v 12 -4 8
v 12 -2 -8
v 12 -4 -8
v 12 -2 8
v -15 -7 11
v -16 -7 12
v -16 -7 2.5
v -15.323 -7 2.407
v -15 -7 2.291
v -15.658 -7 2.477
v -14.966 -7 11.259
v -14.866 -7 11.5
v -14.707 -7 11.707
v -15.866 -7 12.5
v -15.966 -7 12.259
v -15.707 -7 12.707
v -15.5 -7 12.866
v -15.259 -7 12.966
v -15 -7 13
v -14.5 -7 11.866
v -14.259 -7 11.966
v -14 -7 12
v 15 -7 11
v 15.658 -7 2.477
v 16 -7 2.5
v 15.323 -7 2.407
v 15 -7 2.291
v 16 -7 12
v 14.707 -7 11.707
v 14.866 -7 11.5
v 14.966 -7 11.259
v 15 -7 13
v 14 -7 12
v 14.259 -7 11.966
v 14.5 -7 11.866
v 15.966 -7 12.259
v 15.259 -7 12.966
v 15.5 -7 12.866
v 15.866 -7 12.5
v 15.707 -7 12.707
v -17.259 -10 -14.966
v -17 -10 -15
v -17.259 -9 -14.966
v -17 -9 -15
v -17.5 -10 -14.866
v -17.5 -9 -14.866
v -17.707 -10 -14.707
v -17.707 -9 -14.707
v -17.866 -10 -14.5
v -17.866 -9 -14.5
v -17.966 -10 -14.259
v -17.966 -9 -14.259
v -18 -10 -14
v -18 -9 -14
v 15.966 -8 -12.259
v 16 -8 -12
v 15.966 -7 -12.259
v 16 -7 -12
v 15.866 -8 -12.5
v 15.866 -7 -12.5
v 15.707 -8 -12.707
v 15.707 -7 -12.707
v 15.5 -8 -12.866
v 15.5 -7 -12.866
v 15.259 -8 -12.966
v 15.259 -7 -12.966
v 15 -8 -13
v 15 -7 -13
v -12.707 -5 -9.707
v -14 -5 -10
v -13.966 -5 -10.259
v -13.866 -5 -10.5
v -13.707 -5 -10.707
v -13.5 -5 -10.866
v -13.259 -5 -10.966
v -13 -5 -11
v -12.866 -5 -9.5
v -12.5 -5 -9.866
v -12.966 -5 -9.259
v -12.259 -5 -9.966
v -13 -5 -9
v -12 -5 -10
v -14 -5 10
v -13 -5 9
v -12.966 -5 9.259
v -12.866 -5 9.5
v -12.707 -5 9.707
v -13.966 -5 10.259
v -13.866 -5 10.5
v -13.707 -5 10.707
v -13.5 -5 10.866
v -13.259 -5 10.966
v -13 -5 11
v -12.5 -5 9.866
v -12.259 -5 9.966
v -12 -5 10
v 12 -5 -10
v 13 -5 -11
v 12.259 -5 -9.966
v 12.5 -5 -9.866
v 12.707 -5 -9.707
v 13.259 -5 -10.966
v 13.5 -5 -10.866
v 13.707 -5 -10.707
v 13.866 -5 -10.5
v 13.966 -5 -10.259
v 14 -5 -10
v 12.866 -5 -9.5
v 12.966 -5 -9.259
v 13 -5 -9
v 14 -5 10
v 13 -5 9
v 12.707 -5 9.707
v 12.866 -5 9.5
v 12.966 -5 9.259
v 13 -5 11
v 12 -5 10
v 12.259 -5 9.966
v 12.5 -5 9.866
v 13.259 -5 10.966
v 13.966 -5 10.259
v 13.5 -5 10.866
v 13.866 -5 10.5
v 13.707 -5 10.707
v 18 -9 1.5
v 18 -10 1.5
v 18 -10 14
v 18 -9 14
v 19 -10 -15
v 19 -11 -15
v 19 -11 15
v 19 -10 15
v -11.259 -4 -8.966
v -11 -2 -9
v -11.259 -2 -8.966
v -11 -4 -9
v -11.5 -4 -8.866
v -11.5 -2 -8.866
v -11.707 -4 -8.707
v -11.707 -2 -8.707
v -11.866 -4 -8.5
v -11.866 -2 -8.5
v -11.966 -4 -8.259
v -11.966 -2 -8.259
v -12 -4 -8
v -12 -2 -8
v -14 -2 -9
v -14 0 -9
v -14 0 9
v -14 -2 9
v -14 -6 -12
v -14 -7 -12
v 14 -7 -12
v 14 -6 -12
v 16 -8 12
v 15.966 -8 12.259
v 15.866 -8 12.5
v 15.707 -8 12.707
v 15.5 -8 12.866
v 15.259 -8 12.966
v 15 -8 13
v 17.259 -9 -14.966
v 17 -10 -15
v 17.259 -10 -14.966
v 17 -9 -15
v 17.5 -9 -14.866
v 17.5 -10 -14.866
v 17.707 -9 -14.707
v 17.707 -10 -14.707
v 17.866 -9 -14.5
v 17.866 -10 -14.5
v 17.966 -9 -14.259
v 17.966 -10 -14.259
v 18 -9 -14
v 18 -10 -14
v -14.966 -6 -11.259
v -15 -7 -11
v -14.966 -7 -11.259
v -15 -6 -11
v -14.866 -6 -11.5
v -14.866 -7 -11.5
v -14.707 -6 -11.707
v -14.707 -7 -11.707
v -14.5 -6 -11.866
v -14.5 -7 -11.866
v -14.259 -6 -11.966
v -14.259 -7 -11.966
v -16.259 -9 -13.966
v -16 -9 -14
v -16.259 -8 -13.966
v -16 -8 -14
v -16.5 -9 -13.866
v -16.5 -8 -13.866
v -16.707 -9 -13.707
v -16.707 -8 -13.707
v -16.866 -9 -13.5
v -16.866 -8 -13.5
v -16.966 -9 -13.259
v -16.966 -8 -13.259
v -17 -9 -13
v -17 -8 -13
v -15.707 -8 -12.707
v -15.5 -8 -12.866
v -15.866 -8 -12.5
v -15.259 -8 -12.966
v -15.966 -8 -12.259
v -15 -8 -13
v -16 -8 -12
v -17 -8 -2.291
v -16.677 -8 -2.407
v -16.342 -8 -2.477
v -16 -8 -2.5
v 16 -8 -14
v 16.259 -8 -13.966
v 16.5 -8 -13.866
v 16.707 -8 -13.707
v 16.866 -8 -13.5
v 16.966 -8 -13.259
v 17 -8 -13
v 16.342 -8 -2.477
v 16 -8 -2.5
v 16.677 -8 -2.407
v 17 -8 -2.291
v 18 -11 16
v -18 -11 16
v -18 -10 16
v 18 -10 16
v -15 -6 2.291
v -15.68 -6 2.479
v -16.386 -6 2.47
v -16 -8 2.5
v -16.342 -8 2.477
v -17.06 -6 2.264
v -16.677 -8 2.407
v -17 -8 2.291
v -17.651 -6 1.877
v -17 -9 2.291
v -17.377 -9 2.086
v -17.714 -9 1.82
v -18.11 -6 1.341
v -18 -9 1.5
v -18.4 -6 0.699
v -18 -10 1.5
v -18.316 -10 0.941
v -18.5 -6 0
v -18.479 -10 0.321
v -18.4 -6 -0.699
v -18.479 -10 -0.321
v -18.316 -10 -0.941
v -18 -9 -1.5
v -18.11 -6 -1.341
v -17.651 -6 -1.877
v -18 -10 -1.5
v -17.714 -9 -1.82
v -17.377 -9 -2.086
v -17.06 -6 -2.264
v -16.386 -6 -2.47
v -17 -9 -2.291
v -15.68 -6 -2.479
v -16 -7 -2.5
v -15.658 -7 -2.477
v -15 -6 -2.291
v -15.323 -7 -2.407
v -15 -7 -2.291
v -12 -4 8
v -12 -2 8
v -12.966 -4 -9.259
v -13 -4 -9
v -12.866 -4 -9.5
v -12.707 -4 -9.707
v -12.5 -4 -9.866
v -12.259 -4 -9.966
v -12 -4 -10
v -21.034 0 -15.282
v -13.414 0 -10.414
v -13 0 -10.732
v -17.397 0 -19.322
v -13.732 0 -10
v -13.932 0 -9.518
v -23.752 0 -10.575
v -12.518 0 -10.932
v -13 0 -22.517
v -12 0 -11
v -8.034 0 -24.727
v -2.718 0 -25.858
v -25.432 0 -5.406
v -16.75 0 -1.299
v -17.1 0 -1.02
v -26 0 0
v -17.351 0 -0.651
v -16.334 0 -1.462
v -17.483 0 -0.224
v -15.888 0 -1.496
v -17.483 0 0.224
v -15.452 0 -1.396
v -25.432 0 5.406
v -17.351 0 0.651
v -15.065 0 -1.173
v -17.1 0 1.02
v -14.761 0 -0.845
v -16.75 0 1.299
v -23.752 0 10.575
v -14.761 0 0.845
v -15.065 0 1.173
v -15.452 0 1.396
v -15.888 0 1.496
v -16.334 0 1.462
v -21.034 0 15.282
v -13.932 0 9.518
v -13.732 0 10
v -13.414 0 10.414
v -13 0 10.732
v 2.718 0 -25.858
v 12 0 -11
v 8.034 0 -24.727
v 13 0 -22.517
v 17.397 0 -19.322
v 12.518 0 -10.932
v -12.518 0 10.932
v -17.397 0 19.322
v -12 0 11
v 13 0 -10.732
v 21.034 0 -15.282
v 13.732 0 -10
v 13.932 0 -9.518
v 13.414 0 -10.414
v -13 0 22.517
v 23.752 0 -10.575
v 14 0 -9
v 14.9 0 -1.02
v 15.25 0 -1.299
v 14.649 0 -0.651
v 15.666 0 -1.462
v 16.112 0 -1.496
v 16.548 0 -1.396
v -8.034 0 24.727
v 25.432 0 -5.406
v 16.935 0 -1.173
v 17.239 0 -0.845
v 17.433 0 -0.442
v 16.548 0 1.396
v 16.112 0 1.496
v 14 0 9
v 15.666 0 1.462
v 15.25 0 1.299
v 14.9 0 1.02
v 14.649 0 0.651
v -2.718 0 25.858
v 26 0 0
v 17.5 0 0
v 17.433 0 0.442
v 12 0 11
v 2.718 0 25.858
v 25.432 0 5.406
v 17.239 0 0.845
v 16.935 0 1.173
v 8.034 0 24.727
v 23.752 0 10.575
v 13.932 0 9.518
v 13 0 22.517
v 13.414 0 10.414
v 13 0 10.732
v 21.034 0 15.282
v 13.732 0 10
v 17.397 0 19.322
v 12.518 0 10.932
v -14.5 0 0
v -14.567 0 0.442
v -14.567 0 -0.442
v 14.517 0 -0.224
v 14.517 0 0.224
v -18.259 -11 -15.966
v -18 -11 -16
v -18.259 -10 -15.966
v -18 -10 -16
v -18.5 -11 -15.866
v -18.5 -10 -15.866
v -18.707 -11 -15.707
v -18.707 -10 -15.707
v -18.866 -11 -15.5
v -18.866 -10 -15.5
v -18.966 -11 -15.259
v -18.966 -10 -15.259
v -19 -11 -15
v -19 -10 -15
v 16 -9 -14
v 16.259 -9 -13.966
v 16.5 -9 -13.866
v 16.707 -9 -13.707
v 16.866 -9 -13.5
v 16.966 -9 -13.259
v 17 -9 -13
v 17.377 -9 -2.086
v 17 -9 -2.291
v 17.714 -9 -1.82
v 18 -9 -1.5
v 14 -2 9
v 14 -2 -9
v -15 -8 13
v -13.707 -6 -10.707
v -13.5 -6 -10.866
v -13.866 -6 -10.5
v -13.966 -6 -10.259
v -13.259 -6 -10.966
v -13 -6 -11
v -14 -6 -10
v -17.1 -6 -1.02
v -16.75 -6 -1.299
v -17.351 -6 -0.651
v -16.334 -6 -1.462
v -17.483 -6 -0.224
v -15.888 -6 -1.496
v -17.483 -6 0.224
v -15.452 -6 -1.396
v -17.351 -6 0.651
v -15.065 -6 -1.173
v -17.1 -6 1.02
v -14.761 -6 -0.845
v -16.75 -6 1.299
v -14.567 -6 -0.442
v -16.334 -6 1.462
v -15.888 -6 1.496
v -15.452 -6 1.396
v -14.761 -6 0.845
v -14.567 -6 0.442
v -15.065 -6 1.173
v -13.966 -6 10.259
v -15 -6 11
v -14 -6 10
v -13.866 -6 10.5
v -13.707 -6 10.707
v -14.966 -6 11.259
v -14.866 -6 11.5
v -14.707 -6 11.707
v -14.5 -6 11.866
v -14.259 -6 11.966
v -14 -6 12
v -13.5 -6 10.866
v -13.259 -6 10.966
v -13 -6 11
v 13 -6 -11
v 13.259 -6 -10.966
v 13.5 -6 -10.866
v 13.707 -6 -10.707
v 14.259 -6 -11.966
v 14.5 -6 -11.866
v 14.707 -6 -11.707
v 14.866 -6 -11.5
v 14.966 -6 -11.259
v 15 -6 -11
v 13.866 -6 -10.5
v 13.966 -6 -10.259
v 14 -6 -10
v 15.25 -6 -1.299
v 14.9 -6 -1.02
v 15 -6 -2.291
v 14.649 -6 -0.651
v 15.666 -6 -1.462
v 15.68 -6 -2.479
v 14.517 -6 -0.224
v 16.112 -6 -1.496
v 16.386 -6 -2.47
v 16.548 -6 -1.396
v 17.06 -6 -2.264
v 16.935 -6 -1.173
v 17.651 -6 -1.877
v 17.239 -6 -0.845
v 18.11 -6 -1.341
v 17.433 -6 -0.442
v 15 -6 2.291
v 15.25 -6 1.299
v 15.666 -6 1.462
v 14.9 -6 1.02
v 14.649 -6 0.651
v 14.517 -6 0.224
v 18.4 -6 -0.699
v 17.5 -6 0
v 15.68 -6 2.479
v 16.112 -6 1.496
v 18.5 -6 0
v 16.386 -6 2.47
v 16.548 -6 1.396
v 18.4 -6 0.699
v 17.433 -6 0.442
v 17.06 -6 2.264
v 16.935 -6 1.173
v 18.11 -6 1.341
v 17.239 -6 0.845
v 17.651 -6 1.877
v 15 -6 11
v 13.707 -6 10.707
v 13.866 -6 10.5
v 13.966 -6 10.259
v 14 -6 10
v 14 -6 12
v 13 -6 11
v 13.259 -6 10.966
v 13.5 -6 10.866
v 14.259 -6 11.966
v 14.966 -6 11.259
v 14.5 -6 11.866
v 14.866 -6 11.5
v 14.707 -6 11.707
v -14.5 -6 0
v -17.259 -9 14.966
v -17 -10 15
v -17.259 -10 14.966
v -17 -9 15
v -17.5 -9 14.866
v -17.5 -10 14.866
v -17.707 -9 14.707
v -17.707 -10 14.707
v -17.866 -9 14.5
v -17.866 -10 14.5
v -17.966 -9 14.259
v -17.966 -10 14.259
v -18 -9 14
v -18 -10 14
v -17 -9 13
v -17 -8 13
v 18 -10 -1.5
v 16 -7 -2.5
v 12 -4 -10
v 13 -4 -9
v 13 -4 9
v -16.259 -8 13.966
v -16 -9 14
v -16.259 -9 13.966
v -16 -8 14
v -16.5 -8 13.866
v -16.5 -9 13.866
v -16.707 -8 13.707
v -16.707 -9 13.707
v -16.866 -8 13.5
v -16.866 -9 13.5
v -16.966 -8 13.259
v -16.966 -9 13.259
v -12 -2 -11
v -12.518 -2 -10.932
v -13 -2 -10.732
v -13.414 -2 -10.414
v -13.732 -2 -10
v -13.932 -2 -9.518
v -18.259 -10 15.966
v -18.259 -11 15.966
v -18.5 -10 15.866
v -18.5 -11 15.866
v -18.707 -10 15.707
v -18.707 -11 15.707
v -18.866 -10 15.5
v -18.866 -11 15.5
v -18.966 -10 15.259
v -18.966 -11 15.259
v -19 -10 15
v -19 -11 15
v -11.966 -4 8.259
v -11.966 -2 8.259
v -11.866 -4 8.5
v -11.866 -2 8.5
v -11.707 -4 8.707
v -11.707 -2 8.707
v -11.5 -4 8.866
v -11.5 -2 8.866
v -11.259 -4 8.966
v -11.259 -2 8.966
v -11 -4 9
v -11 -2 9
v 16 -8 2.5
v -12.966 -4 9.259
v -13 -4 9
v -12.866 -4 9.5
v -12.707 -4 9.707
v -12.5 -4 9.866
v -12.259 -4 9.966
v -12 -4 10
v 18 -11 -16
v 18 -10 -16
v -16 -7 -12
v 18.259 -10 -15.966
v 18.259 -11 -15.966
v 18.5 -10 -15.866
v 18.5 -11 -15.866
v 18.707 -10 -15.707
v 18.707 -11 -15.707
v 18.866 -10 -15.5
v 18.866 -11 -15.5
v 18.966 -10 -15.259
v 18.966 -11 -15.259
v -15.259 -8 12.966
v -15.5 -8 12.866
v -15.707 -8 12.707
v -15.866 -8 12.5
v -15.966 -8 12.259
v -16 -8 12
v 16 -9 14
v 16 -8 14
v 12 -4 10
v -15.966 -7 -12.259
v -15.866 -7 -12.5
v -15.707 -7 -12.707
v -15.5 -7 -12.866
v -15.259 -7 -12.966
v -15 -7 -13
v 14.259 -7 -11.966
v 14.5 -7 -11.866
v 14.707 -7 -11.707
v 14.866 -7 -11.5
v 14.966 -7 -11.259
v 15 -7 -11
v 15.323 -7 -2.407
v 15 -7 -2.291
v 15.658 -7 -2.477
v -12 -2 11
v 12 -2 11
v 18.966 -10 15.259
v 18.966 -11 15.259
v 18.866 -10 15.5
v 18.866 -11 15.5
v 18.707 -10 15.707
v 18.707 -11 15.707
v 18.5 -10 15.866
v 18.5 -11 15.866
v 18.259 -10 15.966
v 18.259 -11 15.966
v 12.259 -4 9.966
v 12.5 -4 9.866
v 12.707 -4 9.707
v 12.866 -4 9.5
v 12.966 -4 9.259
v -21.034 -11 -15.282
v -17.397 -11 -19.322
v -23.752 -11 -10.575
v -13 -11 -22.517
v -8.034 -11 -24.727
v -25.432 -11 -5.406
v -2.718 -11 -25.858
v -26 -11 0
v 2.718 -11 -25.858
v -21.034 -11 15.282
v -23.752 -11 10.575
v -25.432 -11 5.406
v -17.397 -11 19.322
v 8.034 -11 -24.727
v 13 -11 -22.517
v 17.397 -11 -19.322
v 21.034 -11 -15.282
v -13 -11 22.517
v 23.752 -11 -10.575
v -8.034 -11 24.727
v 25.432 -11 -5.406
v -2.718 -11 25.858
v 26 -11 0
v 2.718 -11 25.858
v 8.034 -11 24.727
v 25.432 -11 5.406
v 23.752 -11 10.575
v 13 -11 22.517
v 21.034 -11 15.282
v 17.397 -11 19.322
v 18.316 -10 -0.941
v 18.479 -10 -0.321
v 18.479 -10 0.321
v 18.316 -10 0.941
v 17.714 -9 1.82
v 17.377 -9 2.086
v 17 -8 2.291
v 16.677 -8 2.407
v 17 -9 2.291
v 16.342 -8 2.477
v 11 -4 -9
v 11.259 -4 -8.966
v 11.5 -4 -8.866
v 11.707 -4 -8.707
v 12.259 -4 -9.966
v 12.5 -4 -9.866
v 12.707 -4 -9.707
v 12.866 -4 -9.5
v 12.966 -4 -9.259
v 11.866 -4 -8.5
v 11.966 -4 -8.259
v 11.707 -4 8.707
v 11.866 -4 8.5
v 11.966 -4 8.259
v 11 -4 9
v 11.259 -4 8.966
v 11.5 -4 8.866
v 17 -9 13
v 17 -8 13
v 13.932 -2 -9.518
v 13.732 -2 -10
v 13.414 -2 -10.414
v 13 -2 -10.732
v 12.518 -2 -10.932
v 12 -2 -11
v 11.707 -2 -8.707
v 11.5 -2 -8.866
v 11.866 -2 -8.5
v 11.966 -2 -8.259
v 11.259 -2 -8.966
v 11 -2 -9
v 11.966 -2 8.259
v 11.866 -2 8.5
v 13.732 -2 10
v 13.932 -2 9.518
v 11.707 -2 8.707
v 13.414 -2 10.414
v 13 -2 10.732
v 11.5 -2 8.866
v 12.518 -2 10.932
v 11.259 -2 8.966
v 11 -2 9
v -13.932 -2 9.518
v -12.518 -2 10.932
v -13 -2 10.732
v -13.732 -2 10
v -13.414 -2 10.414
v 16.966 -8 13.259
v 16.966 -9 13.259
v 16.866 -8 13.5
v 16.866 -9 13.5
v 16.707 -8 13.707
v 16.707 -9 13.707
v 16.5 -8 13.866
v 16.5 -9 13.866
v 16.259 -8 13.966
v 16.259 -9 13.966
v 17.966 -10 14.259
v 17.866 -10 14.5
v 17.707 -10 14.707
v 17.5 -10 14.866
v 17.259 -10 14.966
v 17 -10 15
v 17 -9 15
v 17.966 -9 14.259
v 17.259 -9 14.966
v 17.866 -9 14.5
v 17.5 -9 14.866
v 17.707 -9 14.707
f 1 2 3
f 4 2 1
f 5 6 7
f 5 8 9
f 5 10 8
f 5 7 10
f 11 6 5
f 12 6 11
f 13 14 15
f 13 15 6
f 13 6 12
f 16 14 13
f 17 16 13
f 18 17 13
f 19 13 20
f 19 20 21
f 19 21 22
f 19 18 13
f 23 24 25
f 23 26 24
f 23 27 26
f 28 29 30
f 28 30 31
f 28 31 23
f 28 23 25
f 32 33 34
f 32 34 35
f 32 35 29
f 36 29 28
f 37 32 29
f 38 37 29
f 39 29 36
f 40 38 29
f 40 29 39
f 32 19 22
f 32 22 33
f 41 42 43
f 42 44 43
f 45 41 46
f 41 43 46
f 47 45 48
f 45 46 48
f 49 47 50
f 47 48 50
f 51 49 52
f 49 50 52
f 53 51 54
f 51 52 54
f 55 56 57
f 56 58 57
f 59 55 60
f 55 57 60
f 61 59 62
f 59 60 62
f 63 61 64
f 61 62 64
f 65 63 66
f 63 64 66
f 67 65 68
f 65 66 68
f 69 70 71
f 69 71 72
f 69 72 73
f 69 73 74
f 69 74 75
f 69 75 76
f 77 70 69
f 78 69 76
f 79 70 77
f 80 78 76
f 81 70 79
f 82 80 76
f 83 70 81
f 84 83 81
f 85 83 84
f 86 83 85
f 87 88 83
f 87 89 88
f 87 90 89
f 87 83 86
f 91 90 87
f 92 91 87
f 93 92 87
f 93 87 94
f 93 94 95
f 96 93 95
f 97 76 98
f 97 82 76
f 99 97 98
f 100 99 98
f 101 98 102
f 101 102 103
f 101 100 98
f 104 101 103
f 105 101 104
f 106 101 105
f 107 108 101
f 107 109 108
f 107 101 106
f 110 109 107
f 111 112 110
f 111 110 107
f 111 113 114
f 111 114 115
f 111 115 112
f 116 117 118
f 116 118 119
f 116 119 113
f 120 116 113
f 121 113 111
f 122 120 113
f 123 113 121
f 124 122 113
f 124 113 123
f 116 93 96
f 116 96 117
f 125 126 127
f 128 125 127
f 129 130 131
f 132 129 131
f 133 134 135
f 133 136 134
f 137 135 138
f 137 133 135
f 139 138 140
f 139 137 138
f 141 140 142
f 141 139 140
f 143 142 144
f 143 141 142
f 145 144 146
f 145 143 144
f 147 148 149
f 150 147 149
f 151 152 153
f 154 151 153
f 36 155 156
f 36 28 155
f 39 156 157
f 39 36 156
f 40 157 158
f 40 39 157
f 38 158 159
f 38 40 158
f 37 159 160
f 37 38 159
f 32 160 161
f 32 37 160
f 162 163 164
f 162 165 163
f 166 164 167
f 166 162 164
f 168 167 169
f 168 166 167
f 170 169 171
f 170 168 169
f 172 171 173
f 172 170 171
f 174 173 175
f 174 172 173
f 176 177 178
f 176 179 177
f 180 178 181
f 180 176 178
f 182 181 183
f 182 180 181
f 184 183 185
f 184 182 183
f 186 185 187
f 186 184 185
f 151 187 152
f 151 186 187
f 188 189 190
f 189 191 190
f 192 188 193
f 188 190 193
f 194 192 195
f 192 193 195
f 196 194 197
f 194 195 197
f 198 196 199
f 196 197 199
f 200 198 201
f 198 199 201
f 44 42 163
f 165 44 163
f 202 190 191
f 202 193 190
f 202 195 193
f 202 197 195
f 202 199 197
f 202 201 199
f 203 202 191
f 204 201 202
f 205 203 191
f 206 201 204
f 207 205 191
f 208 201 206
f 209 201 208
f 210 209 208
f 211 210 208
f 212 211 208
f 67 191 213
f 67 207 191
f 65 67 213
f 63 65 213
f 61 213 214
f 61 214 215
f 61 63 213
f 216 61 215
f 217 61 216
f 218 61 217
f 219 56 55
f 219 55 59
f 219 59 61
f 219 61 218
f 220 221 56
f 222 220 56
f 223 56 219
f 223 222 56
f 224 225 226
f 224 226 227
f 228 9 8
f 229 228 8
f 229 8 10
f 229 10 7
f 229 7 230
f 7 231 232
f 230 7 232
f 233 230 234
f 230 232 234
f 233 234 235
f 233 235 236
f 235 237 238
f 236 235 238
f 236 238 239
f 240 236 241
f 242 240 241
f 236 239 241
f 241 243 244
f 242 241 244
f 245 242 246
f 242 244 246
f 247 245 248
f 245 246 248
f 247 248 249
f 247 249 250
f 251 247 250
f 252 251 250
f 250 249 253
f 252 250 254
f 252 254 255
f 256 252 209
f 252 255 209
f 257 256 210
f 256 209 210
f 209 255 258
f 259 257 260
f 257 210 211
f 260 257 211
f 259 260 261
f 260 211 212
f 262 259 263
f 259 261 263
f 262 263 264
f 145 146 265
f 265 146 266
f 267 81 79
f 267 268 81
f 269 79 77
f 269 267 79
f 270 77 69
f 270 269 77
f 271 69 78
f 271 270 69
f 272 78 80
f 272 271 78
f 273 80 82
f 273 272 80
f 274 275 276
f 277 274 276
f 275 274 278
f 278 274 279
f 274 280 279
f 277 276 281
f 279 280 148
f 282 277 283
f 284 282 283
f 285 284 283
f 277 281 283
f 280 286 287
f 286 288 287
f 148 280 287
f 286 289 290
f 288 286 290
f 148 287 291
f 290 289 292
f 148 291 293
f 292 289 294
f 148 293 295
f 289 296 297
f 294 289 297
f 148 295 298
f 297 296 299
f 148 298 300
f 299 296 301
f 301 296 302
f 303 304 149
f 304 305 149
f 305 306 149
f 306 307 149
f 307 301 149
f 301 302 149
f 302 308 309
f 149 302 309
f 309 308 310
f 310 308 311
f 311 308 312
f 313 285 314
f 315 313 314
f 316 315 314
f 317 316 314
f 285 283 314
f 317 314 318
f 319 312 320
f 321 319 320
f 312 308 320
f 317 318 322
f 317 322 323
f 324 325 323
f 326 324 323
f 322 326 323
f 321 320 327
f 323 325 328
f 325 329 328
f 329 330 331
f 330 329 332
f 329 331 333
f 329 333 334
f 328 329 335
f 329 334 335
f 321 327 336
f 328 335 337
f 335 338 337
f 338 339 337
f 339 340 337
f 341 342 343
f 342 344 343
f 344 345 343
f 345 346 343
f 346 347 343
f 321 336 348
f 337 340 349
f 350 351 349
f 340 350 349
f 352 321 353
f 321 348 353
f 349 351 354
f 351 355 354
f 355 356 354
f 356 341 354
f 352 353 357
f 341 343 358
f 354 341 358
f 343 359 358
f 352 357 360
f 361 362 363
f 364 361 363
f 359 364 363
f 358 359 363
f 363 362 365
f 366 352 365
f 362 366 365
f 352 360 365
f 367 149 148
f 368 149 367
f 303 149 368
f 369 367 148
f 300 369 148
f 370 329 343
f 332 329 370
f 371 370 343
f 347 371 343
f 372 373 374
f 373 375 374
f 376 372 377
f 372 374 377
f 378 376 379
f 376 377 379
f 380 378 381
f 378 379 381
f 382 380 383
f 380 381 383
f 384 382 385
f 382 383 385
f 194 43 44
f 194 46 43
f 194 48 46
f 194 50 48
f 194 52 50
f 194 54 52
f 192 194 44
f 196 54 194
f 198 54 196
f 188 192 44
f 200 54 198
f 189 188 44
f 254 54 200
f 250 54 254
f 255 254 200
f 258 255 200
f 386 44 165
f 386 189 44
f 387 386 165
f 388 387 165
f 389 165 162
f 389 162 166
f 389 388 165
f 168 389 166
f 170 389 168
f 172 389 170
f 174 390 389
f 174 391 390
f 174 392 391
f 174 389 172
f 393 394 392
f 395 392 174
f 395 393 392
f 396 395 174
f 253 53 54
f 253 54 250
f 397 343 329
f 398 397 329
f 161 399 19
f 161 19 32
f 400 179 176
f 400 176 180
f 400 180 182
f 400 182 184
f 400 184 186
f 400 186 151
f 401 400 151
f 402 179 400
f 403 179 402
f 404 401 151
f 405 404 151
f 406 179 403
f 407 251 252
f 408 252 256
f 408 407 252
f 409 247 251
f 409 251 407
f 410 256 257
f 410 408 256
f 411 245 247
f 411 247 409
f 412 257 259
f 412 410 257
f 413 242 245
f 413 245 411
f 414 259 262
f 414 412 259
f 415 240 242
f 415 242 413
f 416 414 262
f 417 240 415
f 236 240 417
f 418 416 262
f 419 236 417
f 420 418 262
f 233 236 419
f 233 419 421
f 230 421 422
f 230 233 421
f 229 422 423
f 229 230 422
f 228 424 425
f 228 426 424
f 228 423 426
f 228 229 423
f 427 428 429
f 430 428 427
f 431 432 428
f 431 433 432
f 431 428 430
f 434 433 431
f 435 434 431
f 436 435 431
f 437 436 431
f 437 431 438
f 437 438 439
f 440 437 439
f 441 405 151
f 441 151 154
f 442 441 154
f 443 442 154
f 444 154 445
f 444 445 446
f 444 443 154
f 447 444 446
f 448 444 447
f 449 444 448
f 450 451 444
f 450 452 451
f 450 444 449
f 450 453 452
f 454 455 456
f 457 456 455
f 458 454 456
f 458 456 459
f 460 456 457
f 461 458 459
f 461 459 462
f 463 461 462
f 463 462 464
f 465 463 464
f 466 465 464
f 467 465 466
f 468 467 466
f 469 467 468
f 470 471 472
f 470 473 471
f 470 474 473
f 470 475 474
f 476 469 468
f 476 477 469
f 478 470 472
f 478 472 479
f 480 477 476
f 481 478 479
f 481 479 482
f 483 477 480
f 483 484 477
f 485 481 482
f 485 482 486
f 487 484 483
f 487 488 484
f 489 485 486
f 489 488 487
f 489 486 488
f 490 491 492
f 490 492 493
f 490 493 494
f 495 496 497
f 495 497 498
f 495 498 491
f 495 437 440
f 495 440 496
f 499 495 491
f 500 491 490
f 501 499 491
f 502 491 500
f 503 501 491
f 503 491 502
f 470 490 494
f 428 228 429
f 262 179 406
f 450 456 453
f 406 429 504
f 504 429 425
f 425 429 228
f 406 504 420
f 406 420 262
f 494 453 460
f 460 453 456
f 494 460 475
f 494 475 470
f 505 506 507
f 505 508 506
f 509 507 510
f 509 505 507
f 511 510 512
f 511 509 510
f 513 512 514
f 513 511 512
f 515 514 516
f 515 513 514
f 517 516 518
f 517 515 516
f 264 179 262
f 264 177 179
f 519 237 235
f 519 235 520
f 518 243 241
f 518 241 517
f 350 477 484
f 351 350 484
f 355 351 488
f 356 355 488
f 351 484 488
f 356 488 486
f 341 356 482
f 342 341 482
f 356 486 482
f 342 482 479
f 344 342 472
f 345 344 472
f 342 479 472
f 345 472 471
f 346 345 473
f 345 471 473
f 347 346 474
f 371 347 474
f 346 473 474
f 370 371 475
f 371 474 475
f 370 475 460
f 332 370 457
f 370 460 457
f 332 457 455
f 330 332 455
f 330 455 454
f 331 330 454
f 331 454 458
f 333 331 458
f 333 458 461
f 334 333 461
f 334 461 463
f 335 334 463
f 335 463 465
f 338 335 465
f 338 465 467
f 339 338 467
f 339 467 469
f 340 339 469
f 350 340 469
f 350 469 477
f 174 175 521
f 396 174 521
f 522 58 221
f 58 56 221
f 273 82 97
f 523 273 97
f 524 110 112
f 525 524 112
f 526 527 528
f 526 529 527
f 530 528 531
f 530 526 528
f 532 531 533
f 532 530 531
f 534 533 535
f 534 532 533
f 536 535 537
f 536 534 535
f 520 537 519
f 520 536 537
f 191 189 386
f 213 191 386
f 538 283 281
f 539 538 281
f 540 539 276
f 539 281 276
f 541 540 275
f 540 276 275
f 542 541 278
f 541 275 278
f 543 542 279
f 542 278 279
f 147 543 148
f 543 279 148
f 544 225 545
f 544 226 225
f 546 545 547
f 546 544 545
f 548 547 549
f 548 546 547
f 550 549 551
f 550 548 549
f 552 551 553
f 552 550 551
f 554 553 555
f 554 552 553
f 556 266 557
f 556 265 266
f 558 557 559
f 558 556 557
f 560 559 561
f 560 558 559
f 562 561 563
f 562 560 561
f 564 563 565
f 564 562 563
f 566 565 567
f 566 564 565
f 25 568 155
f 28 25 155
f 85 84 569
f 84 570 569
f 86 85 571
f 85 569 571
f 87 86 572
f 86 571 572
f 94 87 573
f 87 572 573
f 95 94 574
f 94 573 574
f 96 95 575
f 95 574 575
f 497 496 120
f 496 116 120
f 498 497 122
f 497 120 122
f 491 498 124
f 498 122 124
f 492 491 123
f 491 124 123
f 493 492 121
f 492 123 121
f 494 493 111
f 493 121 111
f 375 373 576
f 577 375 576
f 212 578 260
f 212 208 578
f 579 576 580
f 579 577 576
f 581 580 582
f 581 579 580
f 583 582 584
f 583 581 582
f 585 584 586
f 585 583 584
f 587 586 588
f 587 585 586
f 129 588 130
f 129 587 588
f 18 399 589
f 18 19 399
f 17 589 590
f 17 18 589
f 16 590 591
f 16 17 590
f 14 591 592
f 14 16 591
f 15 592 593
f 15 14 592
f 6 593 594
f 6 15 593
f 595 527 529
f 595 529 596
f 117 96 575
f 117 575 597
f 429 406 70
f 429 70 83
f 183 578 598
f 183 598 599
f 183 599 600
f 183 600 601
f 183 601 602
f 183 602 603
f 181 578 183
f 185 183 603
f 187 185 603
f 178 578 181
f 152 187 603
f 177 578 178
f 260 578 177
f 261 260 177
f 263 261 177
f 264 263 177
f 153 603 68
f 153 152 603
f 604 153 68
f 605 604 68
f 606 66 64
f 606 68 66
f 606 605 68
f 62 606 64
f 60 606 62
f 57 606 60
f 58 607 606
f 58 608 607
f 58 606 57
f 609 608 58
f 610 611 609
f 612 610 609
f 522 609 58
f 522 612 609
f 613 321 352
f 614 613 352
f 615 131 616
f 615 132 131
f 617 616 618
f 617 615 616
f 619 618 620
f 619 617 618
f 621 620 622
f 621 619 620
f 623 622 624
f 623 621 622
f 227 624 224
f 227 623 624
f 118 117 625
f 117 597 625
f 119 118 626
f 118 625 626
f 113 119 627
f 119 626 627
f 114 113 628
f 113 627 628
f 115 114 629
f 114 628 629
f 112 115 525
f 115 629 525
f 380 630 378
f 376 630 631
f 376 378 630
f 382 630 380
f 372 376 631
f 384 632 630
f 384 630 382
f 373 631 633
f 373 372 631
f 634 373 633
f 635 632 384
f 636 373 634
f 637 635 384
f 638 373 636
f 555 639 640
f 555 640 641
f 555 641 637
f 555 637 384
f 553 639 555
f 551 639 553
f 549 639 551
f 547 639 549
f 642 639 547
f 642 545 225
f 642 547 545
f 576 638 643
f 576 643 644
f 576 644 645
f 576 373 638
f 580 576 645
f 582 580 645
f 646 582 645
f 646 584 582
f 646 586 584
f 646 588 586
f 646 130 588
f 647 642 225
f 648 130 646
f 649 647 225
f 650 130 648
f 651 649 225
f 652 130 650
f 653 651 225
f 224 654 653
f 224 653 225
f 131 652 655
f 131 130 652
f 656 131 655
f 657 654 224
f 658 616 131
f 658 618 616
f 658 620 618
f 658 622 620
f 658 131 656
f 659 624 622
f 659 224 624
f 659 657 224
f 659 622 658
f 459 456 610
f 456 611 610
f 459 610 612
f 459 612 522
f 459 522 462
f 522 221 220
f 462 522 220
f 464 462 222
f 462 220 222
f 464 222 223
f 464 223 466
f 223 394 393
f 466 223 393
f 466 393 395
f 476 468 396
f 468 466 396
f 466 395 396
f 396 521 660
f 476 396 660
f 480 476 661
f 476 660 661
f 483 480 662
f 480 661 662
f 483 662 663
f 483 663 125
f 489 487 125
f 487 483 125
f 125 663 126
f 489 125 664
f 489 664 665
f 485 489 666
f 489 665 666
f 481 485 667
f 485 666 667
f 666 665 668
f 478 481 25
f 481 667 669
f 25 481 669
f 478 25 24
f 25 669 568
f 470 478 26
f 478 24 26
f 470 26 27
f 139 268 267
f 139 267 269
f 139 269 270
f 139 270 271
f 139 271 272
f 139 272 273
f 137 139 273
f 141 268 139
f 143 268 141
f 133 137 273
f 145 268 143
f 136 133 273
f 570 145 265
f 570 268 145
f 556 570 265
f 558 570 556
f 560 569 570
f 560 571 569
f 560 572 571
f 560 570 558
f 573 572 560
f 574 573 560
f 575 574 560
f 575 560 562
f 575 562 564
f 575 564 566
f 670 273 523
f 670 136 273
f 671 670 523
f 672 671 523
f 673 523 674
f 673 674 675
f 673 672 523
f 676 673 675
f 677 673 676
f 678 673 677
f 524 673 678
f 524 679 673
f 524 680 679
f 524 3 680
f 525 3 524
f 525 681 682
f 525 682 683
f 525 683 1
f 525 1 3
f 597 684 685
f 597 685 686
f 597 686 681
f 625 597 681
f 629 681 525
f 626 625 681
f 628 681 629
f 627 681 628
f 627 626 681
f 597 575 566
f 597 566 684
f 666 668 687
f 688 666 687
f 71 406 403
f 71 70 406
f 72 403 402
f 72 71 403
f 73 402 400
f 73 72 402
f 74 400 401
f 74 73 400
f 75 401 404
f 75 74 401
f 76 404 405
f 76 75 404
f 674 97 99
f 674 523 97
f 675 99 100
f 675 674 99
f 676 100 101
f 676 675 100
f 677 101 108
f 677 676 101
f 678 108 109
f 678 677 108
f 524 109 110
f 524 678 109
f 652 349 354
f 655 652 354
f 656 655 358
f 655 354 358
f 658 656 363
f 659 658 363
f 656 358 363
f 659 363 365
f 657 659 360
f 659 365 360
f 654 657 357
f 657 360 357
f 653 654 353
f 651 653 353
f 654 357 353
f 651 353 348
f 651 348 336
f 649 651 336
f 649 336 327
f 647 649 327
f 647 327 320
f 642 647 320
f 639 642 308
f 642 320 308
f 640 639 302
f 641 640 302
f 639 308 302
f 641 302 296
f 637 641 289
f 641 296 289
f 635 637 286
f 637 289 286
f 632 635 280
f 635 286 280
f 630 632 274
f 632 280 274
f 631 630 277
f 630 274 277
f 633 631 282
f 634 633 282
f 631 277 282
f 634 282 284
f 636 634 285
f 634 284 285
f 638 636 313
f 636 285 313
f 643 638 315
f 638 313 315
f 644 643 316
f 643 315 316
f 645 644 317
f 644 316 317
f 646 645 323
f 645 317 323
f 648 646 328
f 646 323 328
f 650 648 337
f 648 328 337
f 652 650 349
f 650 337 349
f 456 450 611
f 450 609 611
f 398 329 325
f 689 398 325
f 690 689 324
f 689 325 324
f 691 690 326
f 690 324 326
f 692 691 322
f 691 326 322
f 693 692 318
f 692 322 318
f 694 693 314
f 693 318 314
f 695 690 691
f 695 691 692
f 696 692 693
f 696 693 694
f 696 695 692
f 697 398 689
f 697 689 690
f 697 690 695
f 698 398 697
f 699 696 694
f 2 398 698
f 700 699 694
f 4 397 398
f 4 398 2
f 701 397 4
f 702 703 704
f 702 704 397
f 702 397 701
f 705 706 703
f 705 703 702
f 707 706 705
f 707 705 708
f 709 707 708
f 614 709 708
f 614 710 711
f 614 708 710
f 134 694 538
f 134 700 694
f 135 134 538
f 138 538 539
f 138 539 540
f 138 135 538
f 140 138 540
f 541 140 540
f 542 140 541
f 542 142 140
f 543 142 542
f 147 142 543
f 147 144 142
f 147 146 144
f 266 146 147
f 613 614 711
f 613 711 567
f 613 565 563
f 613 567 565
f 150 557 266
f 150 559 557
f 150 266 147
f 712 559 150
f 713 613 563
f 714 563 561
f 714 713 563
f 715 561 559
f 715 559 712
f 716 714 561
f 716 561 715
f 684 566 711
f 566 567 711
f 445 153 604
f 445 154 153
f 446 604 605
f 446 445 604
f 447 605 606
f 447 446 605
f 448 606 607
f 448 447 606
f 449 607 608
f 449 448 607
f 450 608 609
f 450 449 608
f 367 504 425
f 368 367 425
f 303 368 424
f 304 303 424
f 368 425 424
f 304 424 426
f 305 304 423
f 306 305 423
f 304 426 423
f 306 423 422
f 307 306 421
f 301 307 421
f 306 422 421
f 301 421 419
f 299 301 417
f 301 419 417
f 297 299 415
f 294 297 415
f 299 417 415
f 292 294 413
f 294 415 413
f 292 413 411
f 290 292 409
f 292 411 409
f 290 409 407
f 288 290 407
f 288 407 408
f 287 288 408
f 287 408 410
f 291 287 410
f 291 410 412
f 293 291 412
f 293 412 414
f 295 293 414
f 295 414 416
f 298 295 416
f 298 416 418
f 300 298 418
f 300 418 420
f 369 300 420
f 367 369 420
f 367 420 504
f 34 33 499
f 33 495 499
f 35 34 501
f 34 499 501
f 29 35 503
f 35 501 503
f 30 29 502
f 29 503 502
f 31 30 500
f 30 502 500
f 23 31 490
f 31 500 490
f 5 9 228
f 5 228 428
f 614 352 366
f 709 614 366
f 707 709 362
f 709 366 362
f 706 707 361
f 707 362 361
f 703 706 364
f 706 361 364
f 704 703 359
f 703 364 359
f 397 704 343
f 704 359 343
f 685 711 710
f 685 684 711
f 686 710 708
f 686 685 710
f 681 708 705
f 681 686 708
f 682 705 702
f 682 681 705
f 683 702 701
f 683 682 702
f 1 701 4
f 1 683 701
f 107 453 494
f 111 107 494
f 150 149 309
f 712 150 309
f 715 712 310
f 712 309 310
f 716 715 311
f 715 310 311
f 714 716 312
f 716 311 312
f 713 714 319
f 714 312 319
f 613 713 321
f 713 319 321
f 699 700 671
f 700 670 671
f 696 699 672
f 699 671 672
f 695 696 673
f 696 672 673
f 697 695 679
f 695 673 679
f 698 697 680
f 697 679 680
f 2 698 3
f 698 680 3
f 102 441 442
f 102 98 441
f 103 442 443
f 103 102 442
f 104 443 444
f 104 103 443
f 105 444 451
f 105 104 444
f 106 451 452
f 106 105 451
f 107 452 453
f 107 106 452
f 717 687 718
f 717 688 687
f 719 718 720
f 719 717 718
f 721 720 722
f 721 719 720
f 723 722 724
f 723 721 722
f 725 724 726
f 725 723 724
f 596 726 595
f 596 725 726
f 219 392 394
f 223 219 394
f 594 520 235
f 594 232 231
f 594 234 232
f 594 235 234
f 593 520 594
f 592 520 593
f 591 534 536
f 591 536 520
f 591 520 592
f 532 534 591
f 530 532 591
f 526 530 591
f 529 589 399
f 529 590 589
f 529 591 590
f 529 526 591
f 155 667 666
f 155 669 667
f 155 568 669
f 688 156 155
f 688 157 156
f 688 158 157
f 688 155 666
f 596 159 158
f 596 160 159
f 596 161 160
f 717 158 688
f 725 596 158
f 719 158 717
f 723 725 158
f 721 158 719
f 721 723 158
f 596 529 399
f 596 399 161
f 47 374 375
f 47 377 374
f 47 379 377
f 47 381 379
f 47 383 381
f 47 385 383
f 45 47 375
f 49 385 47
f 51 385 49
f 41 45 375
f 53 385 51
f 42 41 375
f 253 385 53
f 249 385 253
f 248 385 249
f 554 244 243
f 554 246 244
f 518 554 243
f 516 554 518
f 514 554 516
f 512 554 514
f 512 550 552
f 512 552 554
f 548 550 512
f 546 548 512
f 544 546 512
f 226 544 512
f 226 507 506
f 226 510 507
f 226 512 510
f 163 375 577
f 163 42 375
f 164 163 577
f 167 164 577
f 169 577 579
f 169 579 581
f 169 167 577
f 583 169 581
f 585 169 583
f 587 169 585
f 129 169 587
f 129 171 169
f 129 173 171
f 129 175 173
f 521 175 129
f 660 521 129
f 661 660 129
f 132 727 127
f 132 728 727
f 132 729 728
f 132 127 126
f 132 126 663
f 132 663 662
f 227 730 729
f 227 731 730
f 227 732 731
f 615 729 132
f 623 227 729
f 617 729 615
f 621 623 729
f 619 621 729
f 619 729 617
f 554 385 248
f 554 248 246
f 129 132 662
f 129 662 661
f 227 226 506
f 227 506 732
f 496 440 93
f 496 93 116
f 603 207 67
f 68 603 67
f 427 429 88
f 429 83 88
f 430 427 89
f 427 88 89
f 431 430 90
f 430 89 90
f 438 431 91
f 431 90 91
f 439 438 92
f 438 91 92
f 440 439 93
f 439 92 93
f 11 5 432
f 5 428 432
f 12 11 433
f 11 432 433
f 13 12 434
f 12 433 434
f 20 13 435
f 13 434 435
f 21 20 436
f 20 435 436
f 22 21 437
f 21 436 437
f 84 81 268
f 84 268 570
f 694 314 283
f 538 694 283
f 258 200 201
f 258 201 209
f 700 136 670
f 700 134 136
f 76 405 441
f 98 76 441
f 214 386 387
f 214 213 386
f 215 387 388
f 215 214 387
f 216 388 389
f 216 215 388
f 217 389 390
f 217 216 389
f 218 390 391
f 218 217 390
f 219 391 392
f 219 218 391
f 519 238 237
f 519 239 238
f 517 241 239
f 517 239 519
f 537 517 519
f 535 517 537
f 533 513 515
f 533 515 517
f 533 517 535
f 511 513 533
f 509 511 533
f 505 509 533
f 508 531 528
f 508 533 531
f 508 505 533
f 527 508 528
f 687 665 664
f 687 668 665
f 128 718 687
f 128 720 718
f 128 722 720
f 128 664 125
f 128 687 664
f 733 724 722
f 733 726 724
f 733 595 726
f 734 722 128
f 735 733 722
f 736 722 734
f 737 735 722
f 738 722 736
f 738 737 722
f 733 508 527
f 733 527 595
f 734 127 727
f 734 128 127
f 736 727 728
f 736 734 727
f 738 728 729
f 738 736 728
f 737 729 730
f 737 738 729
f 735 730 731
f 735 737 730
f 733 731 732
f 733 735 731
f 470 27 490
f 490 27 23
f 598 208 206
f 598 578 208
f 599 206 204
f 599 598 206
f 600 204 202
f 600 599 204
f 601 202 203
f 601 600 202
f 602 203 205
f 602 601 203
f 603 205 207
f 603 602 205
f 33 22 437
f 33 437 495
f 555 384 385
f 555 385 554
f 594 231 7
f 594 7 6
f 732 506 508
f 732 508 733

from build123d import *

# Parameters (mm, degrees)
F0_R      = 26
F0_W      = 24
F0_H      = 18
F1_DEPTH  = 11
F3_DEPTH  = 2
F4_W      = 26
F4_H      = 20
F5_DEPTH  = 7
F6_W      = 28
F6_H      = 22
F7_DEPTH  = 6
F8_W      = 30
F8_H      = 24
F9_DEPTH  = 5
F10_W     = 32
F10_H     = 26
F11_DEPTH = 4
F12_DEPTH = 4
F13_W     = 34
F13_H     = 28
F14_DEPTH = 3
F15_W     = 36
F15_H     = 30
F15_W_2   = 34
F15_H_2   = 28
F16_DEPTH = 2
F17_W     = 38
F17_H     = 32
F17_W_2   = 36
F17_H_2   = 30
F18_DEPTH = 1
F19_R     = 1
F20_R     = 1.5
F21_DEPTH = 25
F22_R     = 2.5
F23_DEPTH = 5


with BuildPart() as f1:
    # F0 (on Front) → F1 (new body)
    with BuildSketch(Plane.XZ):
        Circle(F0_R)
        Rectangle(F0_W, F0_H, mode=Mode.SUBTRACT)
    extrude(amount=F1_DEPTH)

    # F2 (on face) → F3 (cut)
    with BuildSketch(Plane(origin=(0, 0, 0), x_dir=(-1, 0, 0), z_dir=(0, 1, 0))):
        with BuildLine():
            ThreePointArc((14, 9), (13.4142135624, 10.4142135624), (12, 11))
            Line((12, 11), (-12, 11))
            ThreePointArc((-12, 11), (-13.4142135624, 10.4142135624), (-14, 9))
            Line((-14, 9), (-14, -9))
            ThreePointArc((-14, -9), (-13.4142135624, -10.4142135624), (-12, -11))
            Line((-12, -11), (12, -11))
            ThreePointArc((12, -11), (13.4142135624, -10.4142135624), (14, -9))
            Line((14, -9), (14, 9))
        make_face()
    extrude(amount=-F3_DEPTH, mode=Mode.SUBTRACT)

    # F4 (on face) → F5 (cut)
    with BuildSketch(Plane.XZ.offset(11)):
        Rectangle(F4_W, F4_H)
    extrude(amount=-F5_DEPTH, mode=Mode.SUBTRACT)

    # F6 (on face) → F7 (cut)
    with BuildSketch(Plane.XZ.offset(11)):
        Rectangle(F6_W, F6_H)
    extrude(amount=-F7_DEPTH, mode=Mode.SUBTRACT)

    # F8 (on face) → F9 (cut)
    with BuildSketch(Plane.XZ.offset(11)):
        Rectangle(F8_W, F8_H)
    extrude(amount=-F9_DEPTH, mode=Mode.SUBTRACT)

    # F10 (on face) → F11 (cut)
    with BuildSketch(Plane.XZ.offset(11)):
        Rectangle(F10_W, F10_H)
    extrude(amount=-F11_DEPTH, mode=Mode.SUBTRACT)

    # F10 (on face) → F12 (cut)
    with BuildSketch(Plane.XZ.offset(11)):
        Rectangle(F10_W, F10_H)
    extrude(amount=-F12_DEPTH, mode=Mode.SUBTRACT)

    # F13 (on face) → F14 (cut)
    with BuildSketch(Plane.XZ.offset(11)):
        Rectangle(F13_W, F13_H)
    extrude(amount=-F14_DEPTH, mode=Mode.SUBTRACT)

    # F15 (on face) → F16 (cut)
    with BuildSketch(Plane.XZ.offset(11)):
        Rectangle(F15_W, F15_H)
        Rectangle(F15_W_2, F15_H_2, mode=Mode.SUBTRACT)
    extrude(amount=-F16_DEPTH, mode=Mode.SUBTRACT)

    # F17 (on face) → F18 (cut)
    with BuildSketch(Plane.XZ.offset(11)):
        Rectangle(F17_W, F17_H)
        Rectangle(F17_W_2, F17_H_2, mode=Mode.SUBTRACT)
    extrude(amount=-F18_DEPTH, mode=Mode.SUBTRACT)

    # F19
    f19_edges = [f1.edges().sort_by_distance(p)[0] for p in [
        (15, -6.5, -12),
        (13, -4.5, -10),
        (14, -5.5, -11),
        (12, -3, -9),
        (-15, -6.5, -12),
        (-14, -5.5, -11),
        (-13, -4.5, -10),
        (-12, -3, -9),
        (-12, -3, 9),
        (-13, -4.5, 10),
        (-14, -5.5, 11),
        (-15, -6.5, 12),
        (15, -6.5, 12),
        (14, -5.5, 11),
        (12, -3, 9),
        (13, -4.5, 10),
        (16, -7.5, -13),
        (17, -8.5, -14),
        (18, -9.5, -15),
        (19, -10.5, -16),
        (-16, -7.5, -13),
        (-17, -8.5, -14),
        (-18, -9.5, -15),
        (-19, -10.5, -16),
        (-16, -7.5, 13),
        (-17, -8.5, 14),
        (-18, -9.5, 15),
        (-19, -10.5, 16),
        (19, -10.5, 16),
        (18, -9.5, 15),
        (16, -7.5, 13),
        (17, -8.5, 14),
    ]]
    fillet(f19_edges, radius=F19_R)

    # F20 (on face) → F21 (cut)
    with BuildSketch(Plane.XZ.offset(11)):
        with Locations((-16, 0)):
            Circle(F20_R)
        with Locations((16, 0)):
            Circle(F20_R)
    extrude(amount=-F21_DEPTH, mode=Mode.SUBTRACT)

    # F22 (on face) → F23 (cut)
    with BuildSketch(Plane.XZ.offset(11)):
        with Locations((-16, 0)):
            Circle(F22_R)
        with Locations((16, 0)):
            Circle(F22_R)
    extrude(amount=-F23_DEPTH, mode=Mode.SUBTRACT)


solid = f1.part
